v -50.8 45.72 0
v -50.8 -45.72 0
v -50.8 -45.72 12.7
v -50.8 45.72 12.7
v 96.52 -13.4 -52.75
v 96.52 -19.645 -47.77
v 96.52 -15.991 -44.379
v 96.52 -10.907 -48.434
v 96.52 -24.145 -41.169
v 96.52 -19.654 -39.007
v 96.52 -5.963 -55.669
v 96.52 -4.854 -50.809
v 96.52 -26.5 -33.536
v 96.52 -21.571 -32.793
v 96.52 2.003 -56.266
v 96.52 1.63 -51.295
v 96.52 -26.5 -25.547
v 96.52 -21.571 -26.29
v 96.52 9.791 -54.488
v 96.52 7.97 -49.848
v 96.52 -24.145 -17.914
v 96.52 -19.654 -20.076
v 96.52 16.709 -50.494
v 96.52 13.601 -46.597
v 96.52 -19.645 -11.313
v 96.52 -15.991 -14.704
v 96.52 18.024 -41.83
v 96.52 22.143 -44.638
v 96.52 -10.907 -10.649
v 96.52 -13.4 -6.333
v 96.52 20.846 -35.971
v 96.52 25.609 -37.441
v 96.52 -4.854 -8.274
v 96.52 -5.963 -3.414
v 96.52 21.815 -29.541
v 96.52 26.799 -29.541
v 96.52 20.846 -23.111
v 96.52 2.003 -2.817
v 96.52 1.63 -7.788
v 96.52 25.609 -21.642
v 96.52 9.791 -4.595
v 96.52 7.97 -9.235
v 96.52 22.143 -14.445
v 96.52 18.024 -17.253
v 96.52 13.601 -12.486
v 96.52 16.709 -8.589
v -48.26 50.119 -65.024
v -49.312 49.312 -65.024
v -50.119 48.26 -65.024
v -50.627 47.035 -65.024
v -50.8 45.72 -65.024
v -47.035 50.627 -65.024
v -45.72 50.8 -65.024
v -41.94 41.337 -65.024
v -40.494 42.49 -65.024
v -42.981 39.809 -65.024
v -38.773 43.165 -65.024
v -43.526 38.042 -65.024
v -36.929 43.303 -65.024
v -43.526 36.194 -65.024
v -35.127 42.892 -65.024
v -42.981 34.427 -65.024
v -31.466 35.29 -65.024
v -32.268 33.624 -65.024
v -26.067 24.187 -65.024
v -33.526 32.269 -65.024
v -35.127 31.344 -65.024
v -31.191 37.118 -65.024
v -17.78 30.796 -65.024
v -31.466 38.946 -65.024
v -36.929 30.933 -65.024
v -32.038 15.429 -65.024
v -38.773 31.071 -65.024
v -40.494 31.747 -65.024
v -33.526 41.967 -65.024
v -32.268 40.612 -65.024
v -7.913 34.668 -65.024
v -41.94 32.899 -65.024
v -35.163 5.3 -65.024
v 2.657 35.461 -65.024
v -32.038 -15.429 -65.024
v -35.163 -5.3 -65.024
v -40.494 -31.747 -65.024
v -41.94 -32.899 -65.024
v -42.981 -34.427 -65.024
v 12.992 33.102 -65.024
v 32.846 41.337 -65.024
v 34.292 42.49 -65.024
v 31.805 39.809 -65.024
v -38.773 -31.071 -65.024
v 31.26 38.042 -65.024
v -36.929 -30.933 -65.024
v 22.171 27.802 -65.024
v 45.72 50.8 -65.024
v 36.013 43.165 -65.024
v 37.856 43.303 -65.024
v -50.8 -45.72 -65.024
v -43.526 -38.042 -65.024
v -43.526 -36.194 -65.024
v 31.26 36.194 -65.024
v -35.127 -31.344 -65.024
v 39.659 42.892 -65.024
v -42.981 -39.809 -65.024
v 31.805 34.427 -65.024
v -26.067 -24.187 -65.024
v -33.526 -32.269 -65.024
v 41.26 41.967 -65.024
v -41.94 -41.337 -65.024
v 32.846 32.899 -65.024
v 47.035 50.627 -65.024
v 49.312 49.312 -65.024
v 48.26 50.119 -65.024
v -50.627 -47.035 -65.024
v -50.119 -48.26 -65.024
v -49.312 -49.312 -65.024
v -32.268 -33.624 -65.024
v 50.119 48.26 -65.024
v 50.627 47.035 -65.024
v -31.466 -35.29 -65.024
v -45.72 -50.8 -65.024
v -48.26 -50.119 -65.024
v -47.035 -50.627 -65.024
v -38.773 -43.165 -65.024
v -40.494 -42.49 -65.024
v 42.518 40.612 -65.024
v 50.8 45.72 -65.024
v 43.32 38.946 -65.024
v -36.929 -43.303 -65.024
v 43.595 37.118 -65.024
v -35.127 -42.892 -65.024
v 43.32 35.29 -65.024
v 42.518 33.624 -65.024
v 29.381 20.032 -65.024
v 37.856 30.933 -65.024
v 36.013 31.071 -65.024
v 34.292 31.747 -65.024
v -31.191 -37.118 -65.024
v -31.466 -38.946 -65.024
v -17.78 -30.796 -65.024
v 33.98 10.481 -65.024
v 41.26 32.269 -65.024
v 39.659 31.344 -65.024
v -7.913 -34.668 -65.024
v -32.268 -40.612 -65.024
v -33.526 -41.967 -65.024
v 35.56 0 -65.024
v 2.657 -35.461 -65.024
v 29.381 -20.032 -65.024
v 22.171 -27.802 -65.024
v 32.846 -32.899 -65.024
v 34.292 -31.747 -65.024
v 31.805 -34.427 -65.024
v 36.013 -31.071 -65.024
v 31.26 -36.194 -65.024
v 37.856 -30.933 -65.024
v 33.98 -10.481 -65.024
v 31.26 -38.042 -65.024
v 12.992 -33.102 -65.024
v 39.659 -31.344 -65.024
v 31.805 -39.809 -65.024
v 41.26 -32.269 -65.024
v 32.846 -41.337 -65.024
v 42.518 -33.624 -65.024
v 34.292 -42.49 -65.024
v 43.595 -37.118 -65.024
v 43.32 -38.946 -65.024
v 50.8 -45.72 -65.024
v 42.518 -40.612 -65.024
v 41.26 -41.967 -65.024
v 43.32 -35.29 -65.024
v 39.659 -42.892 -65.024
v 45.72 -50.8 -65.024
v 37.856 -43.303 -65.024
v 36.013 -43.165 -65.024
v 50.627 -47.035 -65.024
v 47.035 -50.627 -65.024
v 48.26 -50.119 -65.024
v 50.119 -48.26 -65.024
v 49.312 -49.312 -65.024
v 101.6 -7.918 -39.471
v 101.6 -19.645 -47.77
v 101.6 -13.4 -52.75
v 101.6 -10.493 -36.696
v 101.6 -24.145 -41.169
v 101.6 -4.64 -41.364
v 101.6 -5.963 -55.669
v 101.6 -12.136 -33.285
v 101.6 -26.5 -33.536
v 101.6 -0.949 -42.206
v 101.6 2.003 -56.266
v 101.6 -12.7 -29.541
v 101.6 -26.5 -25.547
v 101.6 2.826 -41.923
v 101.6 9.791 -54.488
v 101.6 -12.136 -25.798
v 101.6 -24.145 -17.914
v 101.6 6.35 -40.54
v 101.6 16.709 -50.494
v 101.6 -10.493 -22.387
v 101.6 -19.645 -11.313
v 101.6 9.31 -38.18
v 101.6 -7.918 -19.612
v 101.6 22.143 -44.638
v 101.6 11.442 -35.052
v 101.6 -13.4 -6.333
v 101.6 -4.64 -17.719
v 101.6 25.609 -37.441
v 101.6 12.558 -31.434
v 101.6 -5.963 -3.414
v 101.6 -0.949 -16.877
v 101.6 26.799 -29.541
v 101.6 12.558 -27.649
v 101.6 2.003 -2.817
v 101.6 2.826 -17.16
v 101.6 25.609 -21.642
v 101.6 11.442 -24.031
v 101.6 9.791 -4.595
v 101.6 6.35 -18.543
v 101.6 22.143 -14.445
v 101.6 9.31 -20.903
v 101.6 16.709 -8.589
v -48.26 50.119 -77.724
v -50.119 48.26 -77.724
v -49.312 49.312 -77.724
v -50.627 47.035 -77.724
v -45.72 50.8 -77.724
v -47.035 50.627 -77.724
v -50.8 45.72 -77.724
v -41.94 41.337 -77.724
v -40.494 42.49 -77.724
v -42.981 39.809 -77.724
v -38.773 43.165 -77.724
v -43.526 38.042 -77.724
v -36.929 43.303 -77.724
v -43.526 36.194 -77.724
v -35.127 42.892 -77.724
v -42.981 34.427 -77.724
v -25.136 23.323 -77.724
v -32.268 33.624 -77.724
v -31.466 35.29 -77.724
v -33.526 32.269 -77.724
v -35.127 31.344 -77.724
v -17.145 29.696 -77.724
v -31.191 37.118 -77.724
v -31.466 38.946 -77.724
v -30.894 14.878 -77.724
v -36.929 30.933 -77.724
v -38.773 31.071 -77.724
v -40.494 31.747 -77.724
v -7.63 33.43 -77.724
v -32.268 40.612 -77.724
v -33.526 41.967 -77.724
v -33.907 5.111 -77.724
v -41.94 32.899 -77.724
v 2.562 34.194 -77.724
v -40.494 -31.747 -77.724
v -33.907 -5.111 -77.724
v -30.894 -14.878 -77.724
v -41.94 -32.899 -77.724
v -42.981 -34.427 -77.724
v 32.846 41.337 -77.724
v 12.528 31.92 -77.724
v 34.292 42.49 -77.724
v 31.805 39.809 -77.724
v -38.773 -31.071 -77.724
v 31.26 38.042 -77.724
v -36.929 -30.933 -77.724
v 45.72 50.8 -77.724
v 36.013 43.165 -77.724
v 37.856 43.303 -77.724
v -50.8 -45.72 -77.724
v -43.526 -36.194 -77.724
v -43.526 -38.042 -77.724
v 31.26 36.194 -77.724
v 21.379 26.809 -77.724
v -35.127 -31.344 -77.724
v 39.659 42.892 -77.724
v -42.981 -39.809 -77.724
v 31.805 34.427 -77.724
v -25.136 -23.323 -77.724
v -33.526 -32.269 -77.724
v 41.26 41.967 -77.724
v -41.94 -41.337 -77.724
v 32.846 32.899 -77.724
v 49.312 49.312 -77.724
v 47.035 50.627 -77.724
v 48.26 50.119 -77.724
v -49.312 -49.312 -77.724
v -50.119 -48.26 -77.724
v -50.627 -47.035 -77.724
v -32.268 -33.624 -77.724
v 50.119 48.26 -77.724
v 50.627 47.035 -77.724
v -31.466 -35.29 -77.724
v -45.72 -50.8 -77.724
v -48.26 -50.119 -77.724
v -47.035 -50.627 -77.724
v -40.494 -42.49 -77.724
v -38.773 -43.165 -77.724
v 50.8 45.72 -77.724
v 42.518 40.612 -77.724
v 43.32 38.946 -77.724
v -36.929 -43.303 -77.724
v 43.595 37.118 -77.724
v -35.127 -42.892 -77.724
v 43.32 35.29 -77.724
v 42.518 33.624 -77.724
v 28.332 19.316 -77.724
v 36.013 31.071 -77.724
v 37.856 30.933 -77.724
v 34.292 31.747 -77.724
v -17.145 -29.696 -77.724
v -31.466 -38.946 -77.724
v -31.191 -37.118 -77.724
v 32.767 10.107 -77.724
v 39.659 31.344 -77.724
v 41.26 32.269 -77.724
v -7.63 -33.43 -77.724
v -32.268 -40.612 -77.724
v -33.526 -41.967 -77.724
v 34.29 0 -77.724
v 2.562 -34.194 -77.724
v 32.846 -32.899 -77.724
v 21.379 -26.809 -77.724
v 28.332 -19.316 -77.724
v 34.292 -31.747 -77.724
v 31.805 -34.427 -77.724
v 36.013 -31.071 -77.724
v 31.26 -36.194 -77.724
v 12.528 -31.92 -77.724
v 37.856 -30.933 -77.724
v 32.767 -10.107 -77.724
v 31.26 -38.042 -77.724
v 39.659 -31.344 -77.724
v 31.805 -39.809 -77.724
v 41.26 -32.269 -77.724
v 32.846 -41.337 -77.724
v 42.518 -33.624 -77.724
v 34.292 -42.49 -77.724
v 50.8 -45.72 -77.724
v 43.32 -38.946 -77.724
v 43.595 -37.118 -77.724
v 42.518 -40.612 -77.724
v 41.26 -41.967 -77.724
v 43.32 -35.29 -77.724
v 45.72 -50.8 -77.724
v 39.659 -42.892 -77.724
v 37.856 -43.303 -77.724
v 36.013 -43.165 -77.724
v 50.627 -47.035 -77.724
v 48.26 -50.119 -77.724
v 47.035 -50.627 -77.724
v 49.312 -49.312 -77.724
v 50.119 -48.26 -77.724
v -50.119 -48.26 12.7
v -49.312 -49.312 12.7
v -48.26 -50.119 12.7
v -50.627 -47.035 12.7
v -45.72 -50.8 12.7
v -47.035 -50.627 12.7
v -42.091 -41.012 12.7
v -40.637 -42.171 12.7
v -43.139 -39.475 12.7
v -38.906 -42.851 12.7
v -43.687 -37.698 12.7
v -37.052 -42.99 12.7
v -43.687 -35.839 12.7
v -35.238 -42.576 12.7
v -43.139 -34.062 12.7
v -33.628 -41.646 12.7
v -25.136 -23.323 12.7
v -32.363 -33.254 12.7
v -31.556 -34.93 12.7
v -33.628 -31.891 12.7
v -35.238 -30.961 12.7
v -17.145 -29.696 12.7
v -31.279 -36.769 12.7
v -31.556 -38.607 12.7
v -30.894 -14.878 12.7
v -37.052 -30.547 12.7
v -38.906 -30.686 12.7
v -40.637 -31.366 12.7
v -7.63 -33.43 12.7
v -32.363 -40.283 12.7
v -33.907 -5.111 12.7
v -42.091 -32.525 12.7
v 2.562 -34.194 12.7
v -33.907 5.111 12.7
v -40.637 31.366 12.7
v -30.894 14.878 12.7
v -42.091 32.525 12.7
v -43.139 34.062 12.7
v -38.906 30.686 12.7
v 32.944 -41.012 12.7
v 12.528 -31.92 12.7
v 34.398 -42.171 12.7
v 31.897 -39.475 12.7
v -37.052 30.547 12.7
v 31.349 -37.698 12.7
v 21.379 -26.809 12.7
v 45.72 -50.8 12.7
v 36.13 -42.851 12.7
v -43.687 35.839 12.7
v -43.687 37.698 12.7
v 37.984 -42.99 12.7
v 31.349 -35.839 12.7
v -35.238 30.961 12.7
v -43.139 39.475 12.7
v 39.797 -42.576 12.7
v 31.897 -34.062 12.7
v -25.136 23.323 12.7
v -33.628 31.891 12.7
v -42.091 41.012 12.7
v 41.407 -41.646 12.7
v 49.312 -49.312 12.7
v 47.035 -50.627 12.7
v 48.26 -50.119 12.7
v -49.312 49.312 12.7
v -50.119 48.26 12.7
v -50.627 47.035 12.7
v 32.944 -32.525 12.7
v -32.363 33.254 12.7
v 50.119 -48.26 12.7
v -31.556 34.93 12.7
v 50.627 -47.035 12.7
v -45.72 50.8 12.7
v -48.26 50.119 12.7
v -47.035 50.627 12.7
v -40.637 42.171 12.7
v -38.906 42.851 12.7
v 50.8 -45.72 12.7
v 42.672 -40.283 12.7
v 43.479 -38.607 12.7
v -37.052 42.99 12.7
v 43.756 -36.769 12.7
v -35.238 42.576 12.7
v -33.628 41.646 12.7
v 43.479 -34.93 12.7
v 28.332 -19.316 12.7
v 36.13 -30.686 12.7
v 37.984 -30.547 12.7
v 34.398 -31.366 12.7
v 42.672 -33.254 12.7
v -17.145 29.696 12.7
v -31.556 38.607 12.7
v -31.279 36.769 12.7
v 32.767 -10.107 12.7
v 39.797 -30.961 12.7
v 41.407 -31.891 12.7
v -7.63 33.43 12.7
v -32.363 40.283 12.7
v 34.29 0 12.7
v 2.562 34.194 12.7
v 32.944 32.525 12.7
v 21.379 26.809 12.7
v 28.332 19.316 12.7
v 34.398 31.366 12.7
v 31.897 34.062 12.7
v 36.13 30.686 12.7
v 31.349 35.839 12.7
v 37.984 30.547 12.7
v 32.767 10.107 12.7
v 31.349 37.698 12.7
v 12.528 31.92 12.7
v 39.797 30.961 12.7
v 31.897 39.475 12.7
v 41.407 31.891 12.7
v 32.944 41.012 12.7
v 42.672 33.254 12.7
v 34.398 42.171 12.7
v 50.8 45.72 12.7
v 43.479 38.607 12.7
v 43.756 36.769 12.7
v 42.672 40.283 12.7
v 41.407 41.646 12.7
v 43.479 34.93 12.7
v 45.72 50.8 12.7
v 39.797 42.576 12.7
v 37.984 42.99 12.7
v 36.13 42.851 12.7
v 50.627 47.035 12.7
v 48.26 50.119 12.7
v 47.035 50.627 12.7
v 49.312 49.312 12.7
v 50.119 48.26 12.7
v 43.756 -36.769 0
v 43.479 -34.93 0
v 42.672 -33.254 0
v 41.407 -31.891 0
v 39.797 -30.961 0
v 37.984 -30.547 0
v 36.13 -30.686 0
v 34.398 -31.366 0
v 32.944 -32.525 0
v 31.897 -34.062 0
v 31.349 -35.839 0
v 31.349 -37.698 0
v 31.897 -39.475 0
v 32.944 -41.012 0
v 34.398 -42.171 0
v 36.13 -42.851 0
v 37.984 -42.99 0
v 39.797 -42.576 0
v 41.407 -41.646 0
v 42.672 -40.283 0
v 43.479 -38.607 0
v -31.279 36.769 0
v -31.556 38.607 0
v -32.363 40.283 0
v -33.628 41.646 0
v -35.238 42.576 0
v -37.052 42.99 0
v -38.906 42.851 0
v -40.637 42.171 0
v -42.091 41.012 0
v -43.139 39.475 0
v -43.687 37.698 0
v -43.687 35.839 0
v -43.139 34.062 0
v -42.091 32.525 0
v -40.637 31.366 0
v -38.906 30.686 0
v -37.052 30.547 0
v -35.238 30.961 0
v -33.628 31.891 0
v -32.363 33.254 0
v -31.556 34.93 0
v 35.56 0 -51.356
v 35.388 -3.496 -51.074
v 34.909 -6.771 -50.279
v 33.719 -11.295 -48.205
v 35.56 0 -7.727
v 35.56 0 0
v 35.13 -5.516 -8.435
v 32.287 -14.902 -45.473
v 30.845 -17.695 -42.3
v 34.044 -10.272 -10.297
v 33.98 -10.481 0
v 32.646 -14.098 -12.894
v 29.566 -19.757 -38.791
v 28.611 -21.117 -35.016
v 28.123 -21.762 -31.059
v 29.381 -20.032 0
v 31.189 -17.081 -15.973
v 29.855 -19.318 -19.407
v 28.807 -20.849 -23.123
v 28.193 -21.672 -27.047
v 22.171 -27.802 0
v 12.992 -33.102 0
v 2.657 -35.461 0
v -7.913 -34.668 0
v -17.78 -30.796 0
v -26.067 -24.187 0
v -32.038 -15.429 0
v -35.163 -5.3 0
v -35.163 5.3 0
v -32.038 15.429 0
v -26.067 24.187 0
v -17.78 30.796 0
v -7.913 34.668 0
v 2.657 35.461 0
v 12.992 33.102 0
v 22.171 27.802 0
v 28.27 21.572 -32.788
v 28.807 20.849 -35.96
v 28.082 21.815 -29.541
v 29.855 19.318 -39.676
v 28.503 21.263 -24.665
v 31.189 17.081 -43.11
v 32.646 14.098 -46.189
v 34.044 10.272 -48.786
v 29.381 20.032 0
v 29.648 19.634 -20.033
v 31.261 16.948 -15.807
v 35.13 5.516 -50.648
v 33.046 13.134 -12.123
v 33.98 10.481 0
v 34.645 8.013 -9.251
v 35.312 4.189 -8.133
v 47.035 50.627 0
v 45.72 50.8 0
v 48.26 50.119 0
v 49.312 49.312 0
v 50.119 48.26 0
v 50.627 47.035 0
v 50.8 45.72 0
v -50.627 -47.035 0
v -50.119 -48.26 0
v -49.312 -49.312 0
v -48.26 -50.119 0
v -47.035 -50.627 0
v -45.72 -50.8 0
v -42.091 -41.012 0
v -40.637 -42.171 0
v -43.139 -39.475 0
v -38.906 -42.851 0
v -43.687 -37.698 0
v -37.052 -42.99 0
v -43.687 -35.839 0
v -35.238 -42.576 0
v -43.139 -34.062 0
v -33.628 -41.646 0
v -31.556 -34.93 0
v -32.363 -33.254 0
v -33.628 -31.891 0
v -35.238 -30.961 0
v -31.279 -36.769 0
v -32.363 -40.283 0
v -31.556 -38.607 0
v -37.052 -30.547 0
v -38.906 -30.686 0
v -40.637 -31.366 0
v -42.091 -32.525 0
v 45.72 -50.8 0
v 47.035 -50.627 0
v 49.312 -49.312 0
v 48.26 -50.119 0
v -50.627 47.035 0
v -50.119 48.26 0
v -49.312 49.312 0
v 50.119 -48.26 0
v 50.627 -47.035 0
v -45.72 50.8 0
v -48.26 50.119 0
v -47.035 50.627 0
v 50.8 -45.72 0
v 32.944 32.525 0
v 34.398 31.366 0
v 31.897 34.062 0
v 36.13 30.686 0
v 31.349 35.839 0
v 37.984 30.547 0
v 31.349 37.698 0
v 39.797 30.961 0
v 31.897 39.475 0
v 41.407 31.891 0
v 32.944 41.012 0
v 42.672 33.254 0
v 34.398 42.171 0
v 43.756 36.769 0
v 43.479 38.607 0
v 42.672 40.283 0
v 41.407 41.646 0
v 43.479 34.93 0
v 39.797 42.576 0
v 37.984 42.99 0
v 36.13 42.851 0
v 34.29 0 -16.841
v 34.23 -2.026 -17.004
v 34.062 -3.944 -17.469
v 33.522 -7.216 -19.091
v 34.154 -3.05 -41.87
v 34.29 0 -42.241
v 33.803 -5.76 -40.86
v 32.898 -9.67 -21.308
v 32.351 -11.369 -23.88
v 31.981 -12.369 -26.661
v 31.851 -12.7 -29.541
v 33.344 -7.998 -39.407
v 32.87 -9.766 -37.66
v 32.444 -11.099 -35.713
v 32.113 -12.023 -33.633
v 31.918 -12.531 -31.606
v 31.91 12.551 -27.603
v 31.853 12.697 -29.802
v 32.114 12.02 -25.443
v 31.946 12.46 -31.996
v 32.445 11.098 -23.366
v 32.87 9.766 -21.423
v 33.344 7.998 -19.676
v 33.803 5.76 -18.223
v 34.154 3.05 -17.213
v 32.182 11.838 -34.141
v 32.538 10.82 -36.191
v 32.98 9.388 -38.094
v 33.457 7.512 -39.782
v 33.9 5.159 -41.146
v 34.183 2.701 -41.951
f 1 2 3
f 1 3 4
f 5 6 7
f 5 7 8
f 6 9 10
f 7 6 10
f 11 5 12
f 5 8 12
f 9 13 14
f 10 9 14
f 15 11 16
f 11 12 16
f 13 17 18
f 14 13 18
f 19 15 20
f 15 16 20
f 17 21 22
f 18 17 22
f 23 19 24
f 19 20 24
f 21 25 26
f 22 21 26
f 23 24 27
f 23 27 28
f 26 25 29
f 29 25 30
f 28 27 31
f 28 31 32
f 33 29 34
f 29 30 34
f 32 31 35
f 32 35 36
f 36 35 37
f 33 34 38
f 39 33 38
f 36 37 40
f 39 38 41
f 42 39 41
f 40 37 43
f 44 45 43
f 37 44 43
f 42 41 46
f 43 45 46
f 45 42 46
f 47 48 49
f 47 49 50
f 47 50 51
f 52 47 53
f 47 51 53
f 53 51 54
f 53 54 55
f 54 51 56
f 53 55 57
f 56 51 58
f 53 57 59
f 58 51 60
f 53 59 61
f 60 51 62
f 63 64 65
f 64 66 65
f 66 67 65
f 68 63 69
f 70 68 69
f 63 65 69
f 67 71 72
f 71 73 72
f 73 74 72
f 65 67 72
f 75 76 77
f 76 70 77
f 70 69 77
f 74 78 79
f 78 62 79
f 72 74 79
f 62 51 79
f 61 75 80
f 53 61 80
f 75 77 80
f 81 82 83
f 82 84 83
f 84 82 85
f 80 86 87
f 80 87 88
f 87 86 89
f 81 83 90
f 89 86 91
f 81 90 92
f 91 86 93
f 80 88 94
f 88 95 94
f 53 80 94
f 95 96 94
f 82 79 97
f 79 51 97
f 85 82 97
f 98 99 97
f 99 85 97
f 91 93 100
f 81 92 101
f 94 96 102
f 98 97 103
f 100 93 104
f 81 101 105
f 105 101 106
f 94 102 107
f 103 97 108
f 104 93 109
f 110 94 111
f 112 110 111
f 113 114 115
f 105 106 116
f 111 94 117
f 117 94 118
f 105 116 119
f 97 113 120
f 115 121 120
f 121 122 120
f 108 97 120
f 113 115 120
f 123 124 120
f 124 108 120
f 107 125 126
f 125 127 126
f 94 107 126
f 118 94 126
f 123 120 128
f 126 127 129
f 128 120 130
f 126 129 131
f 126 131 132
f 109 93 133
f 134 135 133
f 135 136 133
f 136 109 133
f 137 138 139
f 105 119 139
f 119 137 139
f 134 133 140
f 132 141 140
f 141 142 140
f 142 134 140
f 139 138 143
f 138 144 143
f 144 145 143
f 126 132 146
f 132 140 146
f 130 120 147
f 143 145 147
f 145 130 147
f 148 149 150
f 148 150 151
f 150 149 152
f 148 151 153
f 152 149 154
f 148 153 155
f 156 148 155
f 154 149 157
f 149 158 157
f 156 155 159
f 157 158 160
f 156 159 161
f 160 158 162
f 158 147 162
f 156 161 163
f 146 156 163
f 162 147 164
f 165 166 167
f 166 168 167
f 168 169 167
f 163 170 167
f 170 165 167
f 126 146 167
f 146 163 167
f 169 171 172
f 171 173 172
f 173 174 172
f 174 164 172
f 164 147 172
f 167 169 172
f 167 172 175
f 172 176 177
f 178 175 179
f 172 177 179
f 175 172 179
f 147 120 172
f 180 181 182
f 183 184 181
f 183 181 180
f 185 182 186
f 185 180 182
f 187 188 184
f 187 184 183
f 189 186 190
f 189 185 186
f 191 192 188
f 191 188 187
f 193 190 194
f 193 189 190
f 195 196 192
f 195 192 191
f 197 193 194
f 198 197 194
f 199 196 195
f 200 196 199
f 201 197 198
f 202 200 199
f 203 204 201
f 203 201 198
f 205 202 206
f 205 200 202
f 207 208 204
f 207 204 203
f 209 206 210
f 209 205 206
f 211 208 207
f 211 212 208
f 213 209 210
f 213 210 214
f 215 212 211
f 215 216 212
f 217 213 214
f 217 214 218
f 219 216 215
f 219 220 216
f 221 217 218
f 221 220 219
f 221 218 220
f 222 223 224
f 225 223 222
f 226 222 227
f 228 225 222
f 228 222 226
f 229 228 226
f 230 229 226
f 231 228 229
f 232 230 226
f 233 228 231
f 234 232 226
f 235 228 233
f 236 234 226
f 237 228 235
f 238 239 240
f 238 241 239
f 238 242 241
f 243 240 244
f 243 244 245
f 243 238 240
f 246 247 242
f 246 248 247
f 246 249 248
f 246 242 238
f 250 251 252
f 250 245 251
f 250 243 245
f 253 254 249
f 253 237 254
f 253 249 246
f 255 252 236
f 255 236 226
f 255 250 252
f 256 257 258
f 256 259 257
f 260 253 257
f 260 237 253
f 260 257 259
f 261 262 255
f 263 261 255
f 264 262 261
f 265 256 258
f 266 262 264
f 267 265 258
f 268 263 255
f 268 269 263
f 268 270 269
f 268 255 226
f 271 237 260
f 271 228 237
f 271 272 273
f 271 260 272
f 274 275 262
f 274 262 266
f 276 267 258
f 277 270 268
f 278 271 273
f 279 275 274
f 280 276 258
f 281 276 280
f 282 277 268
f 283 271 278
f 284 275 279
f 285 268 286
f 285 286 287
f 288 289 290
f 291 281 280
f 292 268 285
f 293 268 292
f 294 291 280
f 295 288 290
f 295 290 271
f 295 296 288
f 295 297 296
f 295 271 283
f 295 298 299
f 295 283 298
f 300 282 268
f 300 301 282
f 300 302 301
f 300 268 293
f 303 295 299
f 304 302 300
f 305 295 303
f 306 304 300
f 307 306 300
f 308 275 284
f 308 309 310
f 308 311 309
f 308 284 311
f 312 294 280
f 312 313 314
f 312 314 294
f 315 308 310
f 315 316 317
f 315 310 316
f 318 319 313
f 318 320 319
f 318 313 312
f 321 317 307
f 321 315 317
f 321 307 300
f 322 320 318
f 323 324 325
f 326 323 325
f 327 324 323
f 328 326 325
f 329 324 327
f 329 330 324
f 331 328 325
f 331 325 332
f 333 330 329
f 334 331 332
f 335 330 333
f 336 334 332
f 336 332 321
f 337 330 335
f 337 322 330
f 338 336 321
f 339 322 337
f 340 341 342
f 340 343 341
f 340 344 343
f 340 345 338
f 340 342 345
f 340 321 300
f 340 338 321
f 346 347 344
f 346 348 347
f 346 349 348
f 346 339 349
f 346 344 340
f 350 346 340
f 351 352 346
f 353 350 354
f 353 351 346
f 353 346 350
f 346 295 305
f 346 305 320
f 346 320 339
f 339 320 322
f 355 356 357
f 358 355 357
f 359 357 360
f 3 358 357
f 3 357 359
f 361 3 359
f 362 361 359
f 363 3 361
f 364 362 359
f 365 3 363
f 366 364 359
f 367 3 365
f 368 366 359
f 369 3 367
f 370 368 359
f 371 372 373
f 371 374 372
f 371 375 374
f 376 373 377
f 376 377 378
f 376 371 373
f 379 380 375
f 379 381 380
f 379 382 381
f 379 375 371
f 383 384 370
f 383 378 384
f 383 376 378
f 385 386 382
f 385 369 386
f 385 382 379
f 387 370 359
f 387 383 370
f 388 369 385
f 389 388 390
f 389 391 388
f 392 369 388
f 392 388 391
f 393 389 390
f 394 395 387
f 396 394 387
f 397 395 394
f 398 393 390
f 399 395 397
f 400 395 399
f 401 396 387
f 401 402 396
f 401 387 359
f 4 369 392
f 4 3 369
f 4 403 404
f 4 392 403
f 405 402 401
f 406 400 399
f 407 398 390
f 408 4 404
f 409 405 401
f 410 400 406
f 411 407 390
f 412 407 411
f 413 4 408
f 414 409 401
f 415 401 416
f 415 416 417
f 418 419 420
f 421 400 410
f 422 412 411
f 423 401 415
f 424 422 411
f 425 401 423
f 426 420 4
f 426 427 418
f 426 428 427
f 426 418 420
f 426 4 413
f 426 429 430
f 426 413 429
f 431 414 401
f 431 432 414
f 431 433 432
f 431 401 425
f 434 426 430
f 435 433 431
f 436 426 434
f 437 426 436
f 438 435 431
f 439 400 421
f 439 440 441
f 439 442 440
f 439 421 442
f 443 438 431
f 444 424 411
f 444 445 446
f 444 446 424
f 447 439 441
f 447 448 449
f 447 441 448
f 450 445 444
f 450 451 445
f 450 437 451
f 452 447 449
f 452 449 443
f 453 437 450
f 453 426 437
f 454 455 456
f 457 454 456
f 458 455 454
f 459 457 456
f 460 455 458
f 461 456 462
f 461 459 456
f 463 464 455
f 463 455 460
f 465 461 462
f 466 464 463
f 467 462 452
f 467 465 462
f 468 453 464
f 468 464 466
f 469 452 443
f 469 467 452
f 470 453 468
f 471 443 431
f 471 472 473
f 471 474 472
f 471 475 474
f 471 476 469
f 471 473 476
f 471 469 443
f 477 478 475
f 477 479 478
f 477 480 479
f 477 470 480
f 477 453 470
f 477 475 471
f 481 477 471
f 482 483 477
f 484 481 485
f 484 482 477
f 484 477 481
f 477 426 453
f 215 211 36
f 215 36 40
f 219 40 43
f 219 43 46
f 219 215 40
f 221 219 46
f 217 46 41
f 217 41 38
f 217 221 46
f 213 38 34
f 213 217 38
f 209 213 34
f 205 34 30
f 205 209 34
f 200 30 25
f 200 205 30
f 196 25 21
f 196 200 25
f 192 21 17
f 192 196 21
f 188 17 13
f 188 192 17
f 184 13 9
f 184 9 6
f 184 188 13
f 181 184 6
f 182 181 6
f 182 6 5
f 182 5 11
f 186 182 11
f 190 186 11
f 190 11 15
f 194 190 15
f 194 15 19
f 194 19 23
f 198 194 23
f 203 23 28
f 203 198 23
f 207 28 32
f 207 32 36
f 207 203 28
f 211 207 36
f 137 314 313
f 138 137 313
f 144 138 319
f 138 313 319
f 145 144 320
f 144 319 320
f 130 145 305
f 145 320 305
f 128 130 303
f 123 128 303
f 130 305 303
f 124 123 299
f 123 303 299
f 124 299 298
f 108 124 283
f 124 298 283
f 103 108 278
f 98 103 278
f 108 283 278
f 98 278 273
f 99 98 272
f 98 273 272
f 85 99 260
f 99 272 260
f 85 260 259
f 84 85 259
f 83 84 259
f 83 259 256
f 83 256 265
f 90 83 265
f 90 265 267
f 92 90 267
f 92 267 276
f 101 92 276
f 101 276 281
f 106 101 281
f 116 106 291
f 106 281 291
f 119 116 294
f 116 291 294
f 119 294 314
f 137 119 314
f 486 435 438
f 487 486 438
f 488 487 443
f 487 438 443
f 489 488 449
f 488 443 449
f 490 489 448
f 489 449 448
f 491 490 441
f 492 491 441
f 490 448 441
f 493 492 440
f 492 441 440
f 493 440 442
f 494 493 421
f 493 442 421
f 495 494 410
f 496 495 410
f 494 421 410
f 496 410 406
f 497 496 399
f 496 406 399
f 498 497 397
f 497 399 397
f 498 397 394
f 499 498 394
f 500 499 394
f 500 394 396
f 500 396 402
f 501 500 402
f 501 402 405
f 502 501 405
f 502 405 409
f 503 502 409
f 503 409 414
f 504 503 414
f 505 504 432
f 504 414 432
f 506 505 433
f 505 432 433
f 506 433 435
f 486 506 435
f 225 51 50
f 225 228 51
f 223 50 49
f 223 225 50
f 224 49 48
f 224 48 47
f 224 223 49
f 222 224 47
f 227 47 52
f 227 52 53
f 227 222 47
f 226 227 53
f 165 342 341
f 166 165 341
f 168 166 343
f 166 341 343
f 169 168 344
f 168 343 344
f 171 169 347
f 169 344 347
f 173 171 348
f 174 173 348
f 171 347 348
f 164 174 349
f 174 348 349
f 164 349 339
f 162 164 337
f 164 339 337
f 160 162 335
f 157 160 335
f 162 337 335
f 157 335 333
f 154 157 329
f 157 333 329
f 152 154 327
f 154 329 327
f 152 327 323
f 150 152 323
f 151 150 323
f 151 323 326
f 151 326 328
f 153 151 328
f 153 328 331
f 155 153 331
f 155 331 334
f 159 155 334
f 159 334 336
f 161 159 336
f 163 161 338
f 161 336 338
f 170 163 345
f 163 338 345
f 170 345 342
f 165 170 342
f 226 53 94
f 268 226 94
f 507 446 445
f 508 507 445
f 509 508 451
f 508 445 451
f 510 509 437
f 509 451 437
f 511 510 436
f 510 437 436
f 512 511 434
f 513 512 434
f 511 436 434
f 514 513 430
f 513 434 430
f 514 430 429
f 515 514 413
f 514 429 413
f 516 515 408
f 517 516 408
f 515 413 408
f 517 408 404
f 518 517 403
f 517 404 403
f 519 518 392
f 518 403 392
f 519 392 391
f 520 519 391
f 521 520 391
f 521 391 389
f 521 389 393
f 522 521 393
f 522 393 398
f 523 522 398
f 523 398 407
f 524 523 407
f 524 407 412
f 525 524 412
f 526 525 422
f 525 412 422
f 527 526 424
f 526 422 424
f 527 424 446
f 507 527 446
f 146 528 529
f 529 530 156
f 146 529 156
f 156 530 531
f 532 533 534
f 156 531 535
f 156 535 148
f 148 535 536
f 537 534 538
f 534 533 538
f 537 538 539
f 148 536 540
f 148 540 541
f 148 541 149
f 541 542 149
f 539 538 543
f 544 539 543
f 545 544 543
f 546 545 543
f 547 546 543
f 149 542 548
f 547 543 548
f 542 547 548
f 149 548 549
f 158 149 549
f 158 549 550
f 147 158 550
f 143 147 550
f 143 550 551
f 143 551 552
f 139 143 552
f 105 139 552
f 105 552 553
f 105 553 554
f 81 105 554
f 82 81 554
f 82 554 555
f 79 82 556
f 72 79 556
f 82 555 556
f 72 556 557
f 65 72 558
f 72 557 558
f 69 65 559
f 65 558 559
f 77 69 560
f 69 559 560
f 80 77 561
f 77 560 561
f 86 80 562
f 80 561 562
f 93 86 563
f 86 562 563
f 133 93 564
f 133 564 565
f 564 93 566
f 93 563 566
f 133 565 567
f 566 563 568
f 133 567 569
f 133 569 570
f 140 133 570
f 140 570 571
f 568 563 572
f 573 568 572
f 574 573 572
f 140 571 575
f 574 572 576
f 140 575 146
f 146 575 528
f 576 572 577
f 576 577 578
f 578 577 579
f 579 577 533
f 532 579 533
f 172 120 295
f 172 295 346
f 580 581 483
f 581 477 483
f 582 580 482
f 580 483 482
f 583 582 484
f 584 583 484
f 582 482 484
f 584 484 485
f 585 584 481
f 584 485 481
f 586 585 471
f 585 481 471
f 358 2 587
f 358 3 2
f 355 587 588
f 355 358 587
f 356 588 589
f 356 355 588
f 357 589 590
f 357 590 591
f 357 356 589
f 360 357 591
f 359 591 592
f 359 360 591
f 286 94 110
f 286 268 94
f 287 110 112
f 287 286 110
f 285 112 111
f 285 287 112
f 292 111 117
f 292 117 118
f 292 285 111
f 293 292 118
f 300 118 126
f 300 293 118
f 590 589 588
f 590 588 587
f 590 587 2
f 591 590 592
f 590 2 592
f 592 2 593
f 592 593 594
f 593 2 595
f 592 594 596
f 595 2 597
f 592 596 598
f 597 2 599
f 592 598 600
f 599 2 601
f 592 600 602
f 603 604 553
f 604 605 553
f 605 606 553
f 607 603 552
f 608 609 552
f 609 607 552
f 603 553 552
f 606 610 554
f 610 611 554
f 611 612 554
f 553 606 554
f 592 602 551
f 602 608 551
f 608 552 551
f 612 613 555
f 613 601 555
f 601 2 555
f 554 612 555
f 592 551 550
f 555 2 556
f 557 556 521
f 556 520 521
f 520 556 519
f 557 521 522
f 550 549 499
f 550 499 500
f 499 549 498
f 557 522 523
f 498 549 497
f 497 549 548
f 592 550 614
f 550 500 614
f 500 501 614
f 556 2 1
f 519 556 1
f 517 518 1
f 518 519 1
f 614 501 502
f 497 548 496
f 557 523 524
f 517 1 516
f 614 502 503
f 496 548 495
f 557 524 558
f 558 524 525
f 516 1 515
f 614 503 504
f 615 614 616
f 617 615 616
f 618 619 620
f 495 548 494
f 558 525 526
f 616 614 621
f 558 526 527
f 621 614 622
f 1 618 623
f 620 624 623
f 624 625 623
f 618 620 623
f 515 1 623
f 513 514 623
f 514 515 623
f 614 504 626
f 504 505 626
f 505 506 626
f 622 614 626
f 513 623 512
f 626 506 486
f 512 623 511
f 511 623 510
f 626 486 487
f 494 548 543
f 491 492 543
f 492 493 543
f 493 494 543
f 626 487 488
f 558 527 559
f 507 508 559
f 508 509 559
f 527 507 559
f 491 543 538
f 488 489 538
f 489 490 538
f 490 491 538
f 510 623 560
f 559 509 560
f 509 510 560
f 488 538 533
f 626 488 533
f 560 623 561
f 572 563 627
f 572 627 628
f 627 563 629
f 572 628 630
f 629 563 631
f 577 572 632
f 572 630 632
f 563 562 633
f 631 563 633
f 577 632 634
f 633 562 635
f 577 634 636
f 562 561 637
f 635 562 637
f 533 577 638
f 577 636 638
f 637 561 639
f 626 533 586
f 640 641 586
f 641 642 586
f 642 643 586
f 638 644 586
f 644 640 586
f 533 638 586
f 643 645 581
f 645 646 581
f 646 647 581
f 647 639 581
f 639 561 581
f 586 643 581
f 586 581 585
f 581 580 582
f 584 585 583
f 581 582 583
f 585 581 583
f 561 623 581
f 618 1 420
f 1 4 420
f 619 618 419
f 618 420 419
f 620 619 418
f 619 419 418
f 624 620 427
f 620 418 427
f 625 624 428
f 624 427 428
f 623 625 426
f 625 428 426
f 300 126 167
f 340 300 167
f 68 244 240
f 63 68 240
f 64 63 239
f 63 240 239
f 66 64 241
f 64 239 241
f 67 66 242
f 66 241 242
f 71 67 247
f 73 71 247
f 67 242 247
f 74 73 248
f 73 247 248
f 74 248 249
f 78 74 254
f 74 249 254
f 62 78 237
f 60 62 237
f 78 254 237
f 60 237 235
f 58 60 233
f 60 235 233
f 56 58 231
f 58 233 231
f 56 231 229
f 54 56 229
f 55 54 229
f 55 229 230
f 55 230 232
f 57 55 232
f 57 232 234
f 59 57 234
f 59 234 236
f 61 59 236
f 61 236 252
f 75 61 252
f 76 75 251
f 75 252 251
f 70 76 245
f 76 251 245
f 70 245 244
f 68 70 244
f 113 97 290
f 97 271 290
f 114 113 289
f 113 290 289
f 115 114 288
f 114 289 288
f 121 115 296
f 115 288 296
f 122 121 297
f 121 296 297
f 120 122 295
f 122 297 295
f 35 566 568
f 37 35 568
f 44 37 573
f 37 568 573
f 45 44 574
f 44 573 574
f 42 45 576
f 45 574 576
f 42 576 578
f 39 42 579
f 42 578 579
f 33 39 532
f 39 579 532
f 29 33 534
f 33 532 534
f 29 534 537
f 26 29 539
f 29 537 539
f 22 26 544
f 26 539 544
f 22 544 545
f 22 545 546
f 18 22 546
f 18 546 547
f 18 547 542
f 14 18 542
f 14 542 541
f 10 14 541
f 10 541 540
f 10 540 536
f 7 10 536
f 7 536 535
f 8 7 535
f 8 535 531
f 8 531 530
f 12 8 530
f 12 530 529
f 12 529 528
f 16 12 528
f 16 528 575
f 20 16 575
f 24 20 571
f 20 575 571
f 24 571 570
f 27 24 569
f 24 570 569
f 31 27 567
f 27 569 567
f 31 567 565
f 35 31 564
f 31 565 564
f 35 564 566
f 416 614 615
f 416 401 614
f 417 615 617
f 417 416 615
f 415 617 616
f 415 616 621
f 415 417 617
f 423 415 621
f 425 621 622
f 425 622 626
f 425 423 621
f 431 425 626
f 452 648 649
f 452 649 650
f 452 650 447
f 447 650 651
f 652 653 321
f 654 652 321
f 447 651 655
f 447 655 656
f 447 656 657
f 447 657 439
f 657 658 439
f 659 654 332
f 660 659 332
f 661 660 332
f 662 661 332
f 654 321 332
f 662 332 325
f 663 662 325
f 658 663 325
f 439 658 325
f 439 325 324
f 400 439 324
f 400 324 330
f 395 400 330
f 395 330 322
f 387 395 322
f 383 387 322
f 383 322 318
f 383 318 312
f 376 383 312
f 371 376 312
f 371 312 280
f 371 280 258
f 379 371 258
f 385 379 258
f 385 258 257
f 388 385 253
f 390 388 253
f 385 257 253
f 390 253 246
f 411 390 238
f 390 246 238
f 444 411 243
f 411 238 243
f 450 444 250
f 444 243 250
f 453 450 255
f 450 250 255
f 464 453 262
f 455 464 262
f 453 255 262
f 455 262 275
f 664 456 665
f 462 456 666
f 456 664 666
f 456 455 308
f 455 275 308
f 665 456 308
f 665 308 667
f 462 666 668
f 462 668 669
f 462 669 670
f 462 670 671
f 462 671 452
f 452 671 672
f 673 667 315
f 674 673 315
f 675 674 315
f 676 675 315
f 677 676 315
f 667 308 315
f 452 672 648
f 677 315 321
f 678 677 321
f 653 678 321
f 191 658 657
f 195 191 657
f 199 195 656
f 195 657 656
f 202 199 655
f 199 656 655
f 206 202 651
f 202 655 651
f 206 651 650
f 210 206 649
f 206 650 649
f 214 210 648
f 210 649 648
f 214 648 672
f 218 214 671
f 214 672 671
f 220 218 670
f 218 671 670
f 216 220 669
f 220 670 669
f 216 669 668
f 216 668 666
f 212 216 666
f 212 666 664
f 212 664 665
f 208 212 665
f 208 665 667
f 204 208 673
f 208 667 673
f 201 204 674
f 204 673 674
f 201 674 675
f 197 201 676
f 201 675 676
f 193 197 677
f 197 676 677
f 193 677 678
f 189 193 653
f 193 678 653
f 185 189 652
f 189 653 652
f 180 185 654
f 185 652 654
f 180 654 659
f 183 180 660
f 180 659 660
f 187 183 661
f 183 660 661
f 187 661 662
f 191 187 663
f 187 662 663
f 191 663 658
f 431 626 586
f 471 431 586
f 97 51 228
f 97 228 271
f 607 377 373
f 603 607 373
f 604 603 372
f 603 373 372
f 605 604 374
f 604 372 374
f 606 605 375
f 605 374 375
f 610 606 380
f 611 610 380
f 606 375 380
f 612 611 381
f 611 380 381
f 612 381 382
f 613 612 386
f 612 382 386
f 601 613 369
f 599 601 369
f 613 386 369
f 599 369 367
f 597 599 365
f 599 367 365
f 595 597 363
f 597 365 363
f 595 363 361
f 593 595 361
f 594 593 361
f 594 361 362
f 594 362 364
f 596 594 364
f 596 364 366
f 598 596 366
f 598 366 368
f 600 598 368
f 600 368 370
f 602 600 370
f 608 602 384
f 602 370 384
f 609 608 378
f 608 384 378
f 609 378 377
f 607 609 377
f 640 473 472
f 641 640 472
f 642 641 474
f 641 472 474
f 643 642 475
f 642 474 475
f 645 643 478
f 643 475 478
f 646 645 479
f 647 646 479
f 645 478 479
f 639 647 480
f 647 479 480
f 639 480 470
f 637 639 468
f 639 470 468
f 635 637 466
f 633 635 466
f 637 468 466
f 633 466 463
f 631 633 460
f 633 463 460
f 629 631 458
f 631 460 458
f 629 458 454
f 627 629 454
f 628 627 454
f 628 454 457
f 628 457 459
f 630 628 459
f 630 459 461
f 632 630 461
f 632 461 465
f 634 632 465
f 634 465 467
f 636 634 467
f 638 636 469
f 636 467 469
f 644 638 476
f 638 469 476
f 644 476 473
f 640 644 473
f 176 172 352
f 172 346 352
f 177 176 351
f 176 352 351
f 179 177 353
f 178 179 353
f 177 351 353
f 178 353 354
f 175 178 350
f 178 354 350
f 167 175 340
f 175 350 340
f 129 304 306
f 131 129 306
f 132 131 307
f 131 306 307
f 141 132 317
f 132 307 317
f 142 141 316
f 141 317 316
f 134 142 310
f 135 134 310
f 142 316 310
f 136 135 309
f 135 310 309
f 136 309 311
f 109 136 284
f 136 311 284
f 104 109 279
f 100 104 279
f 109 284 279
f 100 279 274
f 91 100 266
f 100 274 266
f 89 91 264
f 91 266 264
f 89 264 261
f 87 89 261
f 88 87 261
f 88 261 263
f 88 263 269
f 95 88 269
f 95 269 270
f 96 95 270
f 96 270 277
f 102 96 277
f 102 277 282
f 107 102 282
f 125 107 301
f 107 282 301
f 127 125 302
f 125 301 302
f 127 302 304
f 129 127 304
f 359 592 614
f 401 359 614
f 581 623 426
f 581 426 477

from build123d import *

# Parameters (mm, degrees)
F0_W      = 101.6
F0_H      = 101.6
F1_DEPTH  = 12.7
F2_R      = 35.56
F3_DEPTH  = 65.024
F4_W      = 101.6
F4_H      = 101.6
F4_R      = 35.56
F5_DEPTH  = 12.7
F6_R      = 5.08
F7_R      = 21.814847108
F8_DEPTH  = 101.6
F9_R      = 26.7992092516
F10_DEPTH = 5.08
F11_D     = 25.4
F11_DEPTH = 127
F11_TIP   = 7.6309298617
F12_R     = 34.29
F13_DEPTH = 91.44
F14_R     = 6.2386640532
F15_DEPTH = 12.7
F16_R     = 6.2024396885
F17_DEPTH = 12.7


with BuildPart() as f1:
    # F0 (on Top) → F1 (new body)
    with BuildSketch(Plane.XY):
        Rectangle(F0_W, F0_H)
    extrude(amount=F1_DEPTH)

    # F2 (on face) → F3 (join)
    with BuildSketch(Plane(origin=(0, 0, 0), x_dir=(1, 0, 0), z_dir=(0, 0, -1))):
        Circle(F2_R)
    extrude(amount=F3_DEPTH)

    # F4 (on face) → F5 (join)
    with BuildSketch(Plane(origin=(0, 0, -65.024), x_dir=(1, 0, 0), z_dir=(0, 0, -1))):
        Rectangle(F4_W, F4_H)
        Circle(F4_R, mode=Mode.SUBTRACT)
        Circle(F4_R)
    extrude(amount=F5_DEPTH)

    # F6
    f6_edges = [f1.edges().sort_by_distance(p)[0] for p in [
        (50.8, -50.8, 6.35),
        (-50.8, -50.8, 6.35),
        (50.8, 50.8, 6.35),
        (-50.8, 50.8, 6.35),
        (-50.8, 50.8, -71.374),
        (50.8, 50.8, -71.374),
        (50.8, -50.8, -71.374),
        (-50.8, -50.8, -71.374),
    ]]
    fillet(f6_edges, radius=F6_R)

    # F7 (on Right) → F8 (join)
    with BuildSketch(Plane.YZ):
        with Locations((0, -29.541451484)):
            Circle(F7_R)
    extrude(amount=F8_DEPTH)

    # F9 (on face) → F10 (join)
    with BuildSketch(Plane.YZ.offset(101.6)):
        with Locations((0, -29.541451484)):
            Circle(F9_R)
    extrude(amount=-F10_DEPTH)

    # F11
    with Locations(Plane.YZ.offset(101.6)):
        with Locations((0, -29.541451484)):
            Hole(F11_D / 2, depth=F11_DEPTH)
            with Locations((0, 0, -(F11_DEPTH + F11_TIP / 2))):  # 118° drill point
                Cone(0, F11_D / 2, F11_TIP, mode=Mode.SUBTRACT)

    # F12 (on face) → F13 (cut)
    with BuildSketch(Plane(origin=(0, 0, -77.724), x_dir=(1, 0, 0), z_dir=(0, 0, -1))):
        Circle(F12_R)
    extrude(amount=-F13_DEPTH, mode=Mode.SUBTRACT)

    # F14 (on face) → F15 (cut)
    with BuildSketch(Plane.XY.offset(12.7)):
        with Locations((-37.5177375972, 36.7685481906)):
            Circle(F14_R)
        with Locations((-37.5177375972, -36.7685481906)):
            Circle(F14_R)
        with Locations((37.5177375972, 36.7685481906)):
            Circle(F14_R)
        with Locations((37.5177375972, -36.7685481906)):
            Circle(F14_R)
    extrude(amount=-F15_DEPTH, mode=Mode.SUBTRACT)

    # F16 (on face) → F17 (cut)
    with BuildSketch(Plane(origin=(0, 0, -77.724), x_dir=(1, 0, 0), z_dir=(0, 0, -1))):
        with Locations((-37.392988801, 37.1180400252)):
            Circle(F16_R)
        with Locations((37.392988801, 37.1180400252)):
            Circle(F16_R)
        with Locations((-37.392988801, -37.1180400252)):
            Circle(F16_R)
        with Locations((37.392988801, -37.1180400252)):
            Circle(F16_R)
    extrude(amount=-F17_DEPTH, mode=Mode.SUBTRACT)


solid = f1.part
